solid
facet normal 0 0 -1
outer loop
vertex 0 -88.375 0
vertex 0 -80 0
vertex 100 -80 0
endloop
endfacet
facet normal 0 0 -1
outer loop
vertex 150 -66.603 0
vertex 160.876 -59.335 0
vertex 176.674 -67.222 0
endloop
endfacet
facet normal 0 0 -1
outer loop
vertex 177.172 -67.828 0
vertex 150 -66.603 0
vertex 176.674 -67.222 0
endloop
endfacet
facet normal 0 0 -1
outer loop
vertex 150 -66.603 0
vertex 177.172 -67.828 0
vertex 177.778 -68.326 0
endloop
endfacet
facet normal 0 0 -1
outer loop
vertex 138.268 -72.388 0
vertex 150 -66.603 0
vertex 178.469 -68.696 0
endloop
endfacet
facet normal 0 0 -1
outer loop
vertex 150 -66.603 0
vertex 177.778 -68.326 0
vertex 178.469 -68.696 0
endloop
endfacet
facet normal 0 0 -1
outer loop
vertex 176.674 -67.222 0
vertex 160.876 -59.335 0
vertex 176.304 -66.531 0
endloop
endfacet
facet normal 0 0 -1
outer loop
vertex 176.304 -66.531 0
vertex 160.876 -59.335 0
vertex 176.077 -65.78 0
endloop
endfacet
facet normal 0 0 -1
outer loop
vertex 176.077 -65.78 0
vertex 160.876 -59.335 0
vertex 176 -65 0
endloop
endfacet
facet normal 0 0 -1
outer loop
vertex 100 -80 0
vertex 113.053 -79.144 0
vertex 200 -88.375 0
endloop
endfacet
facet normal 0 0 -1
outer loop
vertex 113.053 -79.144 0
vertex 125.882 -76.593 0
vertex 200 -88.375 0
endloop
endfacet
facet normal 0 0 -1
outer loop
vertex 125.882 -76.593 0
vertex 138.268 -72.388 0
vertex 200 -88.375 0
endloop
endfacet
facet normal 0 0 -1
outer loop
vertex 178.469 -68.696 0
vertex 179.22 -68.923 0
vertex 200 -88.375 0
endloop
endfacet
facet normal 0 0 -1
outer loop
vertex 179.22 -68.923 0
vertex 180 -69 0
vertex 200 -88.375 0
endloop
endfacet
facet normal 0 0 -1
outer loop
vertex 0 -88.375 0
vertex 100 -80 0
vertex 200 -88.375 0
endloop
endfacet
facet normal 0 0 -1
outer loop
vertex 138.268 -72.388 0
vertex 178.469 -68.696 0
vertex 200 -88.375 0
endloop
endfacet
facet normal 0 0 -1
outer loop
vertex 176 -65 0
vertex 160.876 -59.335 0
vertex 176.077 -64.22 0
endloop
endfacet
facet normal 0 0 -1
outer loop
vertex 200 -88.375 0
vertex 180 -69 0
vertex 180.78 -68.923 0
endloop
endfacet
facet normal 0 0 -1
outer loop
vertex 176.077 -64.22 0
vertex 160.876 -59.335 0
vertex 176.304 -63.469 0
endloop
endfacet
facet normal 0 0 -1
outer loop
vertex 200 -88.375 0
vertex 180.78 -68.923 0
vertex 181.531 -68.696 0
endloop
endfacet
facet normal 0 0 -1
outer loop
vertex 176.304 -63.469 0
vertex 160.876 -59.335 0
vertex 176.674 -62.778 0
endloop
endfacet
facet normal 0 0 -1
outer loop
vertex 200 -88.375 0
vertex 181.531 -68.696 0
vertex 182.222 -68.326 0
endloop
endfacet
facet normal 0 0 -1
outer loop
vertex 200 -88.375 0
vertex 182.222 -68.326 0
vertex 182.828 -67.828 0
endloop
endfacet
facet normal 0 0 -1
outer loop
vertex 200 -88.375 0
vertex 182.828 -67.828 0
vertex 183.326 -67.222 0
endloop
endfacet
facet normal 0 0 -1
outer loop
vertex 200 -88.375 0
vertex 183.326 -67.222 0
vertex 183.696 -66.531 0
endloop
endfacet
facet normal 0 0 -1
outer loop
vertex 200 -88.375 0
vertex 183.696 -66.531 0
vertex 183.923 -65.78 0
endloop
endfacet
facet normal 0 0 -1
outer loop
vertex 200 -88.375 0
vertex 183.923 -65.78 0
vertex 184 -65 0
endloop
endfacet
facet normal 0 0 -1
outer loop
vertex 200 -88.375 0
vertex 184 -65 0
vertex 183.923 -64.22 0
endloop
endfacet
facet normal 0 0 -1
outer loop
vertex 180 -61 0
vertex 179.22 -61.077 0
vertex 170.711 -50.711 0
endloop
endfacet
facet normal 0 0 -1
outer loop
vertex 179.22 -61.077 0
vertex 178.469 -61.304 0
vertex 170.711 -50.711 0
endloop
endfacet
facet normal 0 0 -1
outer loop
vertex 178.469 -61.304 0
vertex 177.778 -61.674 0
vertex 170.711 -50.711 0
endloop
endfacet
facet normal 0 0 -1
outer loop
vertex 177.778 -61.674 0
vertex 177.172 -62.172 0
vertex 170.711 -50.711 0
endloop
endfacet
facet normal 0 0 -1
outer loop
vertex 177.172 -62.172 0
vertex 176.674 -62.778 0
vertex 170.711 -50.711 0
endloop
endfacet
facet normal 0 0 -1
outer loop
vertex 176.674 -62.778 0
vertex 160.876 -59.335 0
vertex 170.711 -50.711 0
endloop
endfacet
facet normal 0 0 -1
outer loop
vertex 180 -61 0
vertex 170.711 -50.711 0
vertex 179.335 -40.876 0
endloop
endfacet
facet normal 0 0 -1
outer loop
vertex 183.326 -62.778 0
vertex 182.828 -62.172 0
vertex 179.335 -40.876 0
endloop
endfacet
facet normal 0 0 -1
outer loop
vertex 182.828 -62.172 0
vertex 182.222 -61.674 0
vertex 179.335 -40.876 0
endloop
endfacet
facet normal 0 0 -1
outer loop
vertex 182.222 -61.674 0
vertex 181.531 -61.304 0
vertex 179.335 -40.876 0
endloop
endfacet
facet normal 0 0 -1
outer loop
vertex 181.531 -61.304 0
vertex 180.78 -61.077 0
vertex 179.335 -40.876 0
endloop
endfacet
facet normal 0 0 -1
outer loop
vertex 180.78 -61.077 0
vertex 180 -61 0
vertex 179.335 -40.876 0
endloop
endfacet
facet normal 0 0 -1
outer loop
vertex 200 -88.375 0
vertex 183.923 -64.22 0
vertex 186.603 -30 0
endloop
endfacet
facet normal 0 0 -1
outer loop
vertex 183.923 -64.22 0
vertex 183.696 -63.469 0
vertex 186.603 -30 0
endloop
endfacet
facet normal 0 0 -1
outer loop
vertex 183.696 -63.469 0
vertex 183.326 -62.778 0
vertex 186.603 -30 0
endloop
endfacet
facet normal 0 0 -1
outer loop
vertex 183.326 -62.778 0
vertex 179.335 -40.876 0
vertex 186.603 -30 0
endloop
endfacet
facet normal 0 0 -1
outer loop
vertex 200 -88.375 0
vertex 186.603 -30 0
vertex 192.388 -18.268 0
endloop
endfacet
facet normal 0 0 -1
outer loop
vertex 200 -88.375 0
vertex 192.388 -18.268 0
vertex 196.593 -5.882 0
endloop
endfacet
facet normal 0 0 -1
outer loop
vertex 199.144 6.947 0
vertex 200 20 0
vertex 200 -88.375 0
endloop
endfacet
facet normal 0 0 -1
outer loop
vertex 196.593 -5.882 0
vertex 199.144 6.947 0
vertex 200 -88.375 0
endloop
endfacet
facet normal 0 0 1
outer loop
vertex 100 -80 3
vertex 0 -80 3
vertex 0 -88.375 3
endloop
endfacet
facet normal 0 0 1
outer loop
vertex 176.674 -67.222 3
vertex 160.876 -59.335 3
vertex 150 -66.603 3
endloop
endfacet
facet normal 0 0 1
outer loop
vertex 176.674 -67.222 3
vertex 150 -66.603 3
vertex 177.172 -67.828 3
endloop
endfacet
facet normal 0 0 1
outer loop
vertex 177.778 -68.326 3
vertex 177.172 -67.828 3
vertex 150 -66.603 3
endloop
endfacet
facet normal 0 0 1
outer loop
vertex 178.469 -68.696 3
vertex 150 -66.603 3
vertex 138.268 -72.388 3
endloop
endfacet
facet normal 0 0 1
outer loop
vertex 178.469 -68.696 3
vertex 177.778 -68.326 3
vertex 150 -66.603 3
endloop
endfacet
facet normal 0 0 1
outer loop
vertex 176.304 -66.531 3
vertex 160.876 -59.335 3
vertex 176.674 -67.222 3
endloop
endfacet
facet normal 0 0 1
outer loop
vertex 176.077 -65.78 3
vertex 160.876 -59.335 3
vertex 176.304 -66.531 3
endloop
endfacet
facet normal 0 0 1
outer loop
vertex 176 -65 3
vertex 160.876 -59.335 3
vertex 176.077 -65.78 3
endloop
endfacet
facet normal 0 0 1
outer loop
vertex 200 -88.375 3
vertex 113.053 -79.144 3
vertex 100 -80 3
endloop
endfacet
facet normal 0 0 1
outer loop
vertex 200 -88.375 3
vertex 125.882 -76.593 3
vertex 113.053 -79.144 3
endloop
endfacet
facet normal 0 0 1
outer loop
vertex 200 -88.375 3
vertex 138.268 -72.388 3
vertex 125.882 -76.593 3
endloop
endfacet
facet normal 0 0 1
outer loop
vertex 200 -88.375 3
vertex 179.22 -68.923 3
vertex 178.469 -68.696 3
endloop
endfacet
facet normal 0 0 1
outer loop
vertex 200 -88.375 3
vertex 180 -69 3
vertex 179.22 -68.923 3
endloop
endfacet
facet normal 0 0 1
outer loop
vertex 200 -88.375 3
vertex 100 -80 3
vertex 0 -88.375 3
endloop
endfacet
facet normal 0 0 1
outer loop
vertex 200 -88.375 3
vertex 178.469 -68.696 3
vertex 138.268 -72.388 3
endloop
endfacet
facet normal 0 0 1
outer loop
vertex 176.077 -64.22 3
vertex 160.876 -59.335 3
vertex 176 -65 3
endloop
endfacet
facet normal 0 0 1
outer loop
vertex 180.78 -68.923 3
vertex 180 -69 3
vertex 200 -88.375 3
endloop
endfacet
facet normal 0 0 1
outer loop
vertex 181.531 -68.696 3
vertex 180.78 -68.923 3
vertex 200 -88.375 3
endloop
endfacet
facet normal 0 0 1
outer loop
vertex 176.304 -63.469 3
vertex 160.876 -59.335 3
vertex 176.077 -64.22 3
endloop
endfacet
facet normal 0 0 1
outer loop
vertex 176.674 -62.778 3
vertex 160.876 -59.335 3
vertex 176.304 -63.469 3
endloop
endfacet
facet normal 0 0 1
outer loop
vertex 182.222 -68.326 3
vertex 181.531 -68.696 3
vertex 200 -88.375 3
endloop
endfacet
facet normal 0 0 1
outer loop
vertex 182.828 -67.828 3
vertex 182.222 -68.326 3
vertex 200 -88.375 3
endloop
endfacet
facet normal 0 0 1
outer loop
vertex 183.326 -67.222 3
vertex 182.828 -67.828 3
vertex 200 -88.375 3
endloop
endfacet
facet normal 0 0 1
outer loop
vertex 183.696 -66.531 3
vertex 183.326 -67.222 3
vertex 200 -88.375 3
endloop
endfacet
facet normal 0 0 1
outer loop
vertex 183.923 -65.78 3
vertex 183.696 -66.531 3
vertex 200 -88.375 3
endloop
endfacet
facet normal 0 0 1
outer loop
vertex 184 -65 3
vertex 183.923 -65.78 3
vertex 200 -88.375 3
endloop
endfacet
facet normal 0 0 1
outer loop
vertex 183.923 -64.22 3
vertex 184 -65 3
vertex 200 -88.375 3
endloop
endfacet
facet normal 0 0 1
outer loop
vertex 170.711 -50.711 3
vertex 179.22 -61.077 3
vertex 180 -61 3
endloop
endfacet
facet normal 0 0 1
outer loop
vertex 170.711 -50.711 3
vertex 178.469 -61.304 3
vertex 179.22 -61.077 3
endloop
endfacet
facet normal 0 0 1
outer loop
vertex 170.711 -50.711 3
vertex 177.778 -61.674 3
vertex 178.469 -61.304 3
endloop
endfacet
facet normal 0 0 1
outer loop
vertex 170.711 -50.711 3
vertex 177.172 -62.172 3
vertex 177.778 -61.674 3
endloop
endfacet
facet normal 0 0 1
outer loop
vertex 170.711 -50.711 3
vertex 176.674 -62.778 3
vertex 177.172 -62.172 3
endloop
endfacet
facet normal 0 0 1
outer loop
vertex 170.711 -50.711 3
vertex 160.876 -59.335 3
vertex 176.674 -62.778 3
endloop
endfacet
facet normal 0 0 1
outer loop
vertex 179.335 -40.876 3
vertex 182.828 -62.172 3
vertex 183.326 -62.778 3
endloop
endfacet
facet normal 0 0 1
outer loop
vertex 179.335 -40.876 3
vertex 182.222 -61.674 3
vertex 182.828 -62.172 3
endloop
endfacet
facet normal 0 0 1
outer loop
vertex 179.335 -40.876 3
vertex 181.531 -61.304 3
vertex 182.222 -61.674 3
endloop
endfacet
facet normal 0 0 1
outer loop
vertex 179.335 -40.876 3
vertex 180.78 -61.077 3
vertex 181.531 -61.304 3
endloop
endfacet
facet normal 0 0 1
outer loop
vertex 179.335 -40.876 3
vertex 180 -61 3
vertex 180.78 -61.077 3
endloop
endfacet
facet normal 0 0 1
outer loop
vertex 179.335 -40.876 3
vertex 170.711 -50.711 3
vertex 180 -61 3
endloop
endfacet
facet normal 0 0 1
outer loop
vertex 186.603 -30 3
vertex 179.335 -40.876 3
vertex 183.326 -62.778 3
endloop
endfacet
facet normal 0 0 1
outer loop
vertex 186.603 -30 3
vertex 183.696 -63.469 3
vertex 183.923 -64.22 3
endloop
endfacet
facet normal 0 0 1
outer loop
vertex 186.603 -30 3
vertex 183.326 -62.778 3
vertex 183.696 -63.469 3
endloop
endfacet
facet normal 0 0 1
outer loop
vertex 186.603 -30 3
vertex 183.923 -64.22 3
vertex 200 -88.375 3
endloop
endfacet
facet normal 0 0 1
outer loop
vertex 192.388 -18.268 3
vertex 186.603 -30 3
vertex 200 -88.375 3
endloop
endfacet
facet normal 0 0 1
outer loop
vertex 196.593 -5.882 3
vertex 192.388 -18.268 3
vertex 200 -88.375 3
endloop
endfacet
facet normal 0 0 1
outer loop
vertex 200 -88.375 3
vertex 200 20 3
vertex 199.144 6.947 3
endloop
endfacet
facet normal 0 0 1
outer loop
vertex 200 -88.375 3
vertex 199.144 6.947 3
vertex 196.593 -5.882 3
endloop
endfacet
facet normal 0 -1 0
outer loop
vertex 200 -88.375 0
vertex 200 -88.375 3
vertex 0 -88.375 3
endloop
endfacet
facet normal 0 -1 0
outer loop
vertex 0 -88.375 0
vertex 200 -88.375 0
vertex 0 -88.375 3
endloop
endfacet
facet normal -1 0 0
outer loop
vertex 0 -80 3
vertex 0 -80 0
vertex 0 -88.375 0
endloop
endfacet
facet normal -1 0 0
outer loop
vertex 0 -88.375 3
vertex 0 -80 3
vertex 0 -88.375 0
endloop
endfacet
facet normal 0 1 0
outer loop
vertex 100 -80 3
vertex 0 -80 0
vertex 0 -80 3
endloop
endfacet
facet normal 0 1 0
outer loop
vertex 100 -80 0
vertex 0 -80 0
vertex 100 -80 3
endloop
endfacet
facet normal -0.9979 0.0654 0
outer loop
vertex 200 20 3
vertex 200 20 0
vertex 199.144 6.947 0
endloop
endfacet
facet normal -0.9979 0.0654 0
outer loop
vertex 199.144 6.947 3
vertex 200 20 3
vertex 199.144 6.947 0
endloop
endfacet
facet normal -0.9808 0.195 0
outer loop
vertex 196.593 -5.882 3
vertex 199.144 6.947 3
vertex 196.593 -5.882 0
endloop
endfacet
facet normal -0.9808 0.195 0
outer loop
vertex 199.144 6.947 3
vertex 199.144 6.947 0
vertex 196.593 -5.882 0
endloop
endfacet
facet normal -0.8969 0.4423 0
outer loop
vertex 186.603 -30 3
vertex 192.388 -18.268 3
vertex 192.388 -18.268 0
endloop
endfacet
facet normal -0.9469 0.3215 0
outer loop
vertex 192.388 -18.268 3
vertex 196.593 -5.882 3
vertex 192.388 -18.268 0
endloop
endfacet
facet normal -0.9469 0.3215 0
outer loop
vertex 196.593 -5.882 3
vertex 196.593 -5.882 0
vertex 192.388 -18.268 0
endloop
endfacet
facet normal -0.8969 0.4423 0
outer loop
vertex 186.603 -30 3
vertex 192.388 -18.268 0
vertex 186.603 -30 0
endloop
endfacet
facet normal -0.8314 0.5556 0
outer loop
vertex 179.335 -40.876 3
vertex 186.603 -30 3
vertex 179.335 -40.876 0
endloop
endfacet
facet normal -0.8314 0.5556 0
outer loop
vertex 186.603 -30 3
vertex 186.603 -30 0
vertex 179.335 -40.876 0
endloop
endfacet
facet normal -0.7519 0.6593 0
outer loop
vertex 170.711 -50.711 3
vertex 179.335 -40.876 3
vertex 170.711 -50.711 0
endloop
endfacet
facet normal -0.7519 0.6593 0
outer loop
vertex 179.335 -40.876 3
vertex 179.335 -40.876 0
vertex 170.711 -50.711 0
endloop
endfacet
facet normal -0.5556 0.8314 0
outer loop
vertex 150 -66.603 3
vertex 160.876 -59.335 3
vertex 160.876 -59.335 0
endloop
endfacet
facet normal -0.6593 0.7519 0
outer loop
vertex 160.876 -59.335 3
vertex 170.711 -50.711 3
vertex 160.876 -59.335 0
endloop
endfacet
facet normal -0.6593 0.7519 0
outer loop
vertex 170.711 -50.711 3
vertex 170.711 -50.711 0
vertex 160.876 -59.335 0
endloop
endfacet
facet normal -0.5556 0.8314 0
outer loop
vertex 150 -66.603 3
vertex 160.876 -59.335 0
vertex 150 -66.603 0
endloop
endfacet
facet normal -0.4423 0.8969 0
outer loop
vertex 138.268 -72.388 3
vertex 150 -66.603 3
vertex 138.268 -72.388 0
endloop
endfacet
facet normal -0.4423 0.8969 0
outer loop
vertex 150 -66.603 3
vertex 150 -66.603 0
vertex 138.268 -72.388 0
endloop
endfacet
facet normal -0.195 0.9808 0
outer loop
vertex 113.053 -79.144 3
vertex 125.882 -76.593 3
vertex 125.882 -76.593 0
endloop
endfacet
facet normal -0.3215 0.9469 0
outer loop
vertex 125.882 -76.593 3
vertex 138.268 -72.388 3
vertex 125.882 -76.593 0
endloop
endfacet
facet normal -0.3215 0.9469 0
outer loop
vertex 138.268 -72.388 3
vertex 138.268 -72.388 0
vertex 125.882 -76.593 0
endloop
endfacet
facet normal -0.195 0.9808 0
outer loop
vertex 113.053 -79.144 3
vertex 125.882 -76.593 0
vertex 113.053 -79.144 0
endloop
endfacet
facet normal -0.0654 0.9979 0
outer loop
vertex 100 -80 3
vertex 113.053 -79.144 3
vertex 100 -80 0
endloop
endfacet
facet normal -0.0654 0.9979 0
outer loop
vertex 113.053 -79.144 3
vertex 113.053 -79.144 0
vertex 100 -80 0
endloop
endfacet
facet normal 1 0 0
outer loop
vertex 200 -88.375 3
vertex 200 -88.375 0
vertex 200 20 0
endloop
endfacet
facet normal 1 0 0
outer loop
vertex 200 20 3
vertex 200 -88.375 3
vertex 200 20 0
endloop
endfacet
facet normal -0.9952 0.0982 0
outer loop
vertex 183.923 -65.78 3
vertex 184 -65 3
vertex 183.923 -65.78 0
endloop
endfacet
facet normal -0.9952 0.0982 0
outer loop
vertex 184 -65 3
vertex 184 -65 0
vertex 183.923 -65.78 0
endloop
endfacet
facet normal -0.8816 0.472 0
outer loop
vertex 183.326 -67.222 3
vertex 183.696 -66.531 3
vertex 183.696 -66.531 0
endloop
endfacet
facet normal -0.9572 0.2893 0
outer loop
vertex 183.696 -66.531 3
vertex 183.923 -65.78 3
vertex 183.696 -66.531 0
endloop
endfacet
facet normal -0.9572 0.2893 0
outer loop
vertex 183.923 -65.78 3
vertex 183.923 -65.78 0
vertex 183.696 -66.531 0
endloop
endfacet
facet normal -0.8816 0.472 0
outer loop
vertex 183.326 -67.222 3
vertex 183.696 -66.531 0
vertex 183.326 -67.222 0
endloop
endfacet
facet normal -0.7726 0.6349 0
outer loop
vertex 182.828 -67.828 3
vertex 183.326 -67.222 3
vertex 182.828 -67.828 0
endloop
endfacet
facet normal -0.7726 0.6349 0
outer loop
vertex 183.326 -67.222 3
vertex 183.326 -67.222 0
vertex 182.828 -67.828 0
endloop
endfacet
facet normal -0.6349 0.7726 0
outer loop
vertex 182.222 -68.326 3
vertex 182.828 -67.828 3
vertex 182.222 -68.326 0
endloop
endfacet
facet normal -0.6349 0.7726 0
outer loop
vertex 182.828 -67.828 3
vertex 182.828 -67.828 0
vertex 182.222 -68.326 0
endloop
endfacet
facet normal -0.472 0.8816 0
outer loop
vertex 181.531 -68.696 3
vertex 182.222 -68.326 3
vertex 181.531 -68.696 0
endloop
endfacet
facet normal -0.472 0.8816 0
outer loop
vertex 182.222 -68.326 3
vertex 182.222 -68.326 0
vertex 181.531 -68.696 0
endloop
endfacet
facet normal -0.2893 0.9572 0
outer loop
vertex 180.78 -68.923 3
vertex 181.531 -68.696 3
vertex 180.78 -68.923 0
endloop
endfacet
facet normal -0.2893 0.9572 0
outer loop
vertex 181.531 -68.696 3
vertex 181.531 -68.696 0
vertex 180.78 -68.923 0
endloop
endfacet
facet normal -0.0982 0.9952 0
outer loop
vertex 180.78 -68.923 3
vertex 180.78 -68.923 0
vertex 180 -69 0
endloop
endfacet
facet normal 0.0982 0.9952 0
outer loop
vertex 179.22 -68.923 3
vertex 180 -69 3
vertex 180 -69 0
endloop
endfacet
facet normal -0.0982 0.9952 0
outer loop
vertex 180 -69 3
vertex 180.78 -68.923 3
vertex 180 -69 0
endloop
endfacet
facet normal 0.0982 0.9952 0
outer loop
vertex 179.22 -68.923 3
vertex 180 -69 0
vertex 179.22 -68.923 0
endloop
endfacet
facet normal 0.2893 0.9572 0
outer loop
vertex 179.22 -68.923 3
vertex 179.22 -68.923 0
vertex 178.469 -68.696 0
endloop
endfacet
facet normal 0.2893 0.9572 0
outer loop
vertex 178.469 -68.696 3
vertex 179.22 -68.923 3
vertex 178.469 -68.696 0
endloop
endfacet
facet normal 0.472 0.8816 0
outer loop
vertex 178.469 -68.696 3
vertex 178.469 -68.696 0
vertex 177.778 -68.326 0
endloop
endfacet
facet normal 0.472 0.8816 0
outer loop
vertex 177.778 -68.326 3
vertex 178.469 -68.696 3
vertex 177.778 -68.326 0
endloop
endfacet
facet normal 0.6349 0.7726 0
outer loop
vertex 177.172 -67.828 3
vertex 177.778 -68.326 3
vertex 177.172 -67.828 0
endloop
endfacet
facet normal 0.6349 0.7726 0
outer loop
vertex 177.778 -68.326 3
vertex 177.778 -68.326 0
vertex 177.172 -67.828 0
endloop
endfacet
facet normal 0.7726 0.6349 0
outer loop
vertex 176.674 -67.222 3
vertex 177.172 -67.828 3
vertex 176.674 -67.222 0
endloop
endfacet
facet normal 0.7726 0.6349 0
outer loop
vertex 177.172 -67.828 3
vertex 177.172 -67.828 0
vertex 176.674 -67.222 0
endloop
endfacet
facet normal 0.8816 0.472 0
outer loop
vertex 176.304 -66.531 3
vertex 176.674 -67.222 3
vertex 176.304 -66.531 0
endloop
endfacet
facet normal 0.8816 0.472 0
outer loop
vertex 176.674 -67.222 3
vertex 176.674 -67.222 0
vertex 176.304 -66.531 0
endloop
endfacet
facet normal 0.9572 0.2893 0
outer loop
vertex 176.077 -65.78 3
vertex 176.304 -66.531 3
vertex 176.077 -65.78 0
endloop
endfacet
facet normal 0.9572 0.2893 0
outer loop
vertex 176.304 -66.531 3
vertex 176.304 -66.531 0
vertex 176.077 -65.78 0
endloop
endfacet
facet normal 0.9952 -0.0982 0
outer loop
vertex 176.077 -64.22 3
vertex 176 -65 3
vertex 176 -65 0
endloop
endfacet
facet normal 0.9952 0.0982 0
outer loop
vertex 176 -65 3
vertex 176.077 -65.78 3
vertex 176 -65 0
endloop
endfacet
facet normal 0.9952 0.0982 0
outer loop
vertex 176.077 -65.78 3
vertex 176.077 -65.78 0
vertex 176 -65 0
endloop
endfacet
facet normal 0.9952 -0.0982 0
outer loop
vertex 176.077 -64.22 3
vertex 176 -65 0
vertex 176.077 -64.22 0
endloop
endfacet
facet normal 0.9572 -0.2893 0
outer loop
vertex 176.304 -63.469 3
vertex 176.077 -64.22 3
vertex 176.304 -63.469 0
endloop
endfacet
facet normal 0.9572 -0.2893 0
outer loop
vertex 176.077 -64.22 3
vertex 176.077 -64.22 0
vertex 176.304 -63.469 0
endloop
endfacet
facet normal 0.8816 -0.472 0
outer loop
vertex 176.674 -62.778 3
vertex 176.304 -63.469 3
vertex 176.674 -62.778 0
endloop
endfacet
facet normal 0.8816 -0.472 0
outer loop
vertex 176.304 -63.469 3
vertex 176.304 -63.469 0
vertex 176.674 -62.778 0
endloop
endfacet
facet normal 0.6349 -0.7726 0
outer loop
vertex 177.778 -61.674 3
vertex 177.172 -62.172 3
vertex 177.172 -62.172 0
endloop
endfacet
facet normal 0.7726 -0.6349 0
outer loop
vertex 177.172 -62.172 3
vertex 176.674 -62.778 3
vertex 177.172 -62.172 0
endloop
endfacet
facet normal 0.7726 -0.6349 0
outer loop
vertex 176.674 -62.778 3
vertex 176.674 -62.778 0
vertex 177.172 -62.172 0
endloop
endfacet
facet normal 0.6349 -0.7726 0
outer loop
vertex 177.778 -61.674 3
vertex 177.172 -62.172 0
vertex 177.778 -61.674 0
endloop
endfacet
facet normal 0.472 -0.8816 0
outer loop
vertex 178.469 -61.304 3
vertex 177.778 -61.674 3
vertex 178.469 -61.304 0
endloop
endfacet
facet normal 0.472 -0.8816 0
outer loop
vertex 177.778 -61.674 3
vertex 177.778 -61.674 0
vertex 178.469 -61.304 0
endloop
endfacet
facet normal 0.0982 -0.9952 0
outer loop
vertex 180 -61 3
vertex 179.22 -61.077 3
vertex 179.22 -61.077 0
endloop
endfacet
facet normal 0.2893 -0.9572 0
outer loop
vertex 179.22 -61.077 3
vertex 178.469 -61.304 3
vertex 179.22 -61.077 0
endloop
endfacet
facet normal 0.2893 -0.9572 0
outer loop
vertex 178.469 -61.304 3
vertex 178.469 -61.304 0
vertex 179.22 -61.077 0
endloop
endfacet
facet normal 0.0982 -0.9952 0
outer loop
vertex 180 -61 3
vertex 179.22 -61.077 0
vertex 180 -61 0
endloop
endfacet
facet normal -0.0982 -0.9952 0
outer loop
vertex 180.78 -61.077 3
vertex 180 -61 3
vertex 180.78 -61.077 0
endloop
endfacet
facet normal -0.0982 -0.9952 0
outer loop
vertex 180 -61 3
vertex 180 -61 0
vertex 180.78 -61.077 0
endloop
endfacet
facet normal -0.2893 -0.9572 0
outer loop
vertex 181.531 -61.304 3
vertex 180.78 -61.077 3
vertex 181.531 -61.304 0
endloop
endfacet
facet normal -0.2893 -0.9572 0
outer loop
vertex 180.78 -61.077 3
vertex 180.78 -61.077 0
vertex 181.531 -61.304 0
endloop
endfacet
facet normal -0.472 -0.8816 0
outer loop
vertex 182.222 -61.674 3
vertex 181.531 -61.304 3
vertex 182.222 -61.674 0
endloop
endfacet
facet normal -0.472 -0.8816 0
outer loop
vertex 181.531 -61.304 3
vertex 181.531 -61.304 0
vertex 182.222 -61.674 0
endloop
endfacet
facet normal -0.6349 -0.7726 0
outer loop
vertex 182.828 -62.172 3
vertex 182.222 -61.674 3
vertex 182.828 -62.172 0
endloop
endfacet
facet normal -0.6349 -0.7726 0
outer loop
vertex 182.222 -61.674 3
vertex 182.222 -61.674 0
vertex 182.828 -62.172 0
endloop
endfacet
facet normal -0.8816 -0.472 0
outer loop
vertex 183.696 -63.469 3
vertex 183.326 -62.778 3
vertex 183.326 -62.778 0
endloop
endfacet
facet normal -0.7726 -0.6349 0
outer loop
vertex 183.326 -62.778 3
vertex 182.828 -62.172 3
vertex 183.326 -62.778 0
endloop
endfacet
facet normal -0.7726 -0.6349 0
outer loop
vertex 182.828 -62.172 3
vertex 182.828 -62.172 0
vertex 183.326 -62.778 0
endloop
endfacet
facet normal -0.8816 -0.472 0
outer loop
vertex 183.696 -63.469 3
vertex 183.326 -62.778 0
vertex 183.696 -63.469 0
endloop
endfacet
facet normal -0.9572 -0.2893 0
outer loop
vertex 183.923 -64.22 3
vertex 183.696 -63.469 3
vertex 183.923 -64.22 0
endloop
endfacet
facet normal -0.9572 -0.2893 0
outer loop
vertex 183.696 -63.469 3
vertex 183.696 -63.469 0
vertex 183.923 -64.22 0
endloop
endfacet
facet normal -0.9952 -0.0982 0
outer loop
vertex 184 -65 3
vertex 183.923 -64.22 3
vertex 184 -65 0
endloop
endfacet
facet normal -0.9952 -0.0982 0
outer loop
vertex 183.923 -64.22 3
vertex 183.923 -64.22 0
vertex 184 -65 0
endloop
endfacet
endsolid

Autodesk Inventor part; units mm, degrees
ref_plane "YZ Plane" through (0, 0, 0) normal (1, 0, 0) x (0, 1, 0)
ref_plane "XZ Plane" through (0, 0, 0) normal (0, 1, 0) x (-1, 0, 0)
ref_plane "XY Plane" through (0, 0, 0) normal (0, 0, 1) x (1, 0, 0)
sketch "草圖1" plane through (0, 0, 0) normal (0, 0, 1) x (1, 0, 0)
  line L0 (0, -80) -> (100, -80)
  arc A0 (100, -80) -> (200, 20) centre (100, 20) ccw
  line L1 (200, 20) -> (200, 40)
  line L2 (200, 40) -> (100, 40)
  line L3 (100, 40) -> (100, -80)
  line L4 (100, -80) -> (200, -80)
  line L5 (200, -80) -> (200, 40)
  line L6 (215, -80) -> (200, -80)
  circle A1 centre (180, -65) radius 4
  line L7 (200, -80) -> (0, -80)
  line L8 (0, -80) -> (0, -88.525)
  line L9 (0, -88.525) -> (200, -88.525)
  line L10 (200, -88.525) -> (200, -80)
  point P0 (200, 20)
  dimension "d5" = 8
  dimension "d6" = 8.525
  dimension "d12" = 15
  dimension "d13" = 20
extrude "擠出1" add sketch "草圖1" along normal blind 3 contours L0 L4 L10 L9 L8 | A0 L5 L4
sketch "草圖3" plane through (0, 0, 3) normal (0, 0, 1) x (1, 0, 0)
  line L0 (200, -88.525) -> (200, 20) projected
  line L1 (0, -88.525) -> (200, -88.525) projected
  line L2 (0, -88.525) -> (200, -88.525)
  line L3 (200, -88.525) -> (200, -88.375)
  line L4 (200, -88.375) -> (0, -88.375)
  line L5 (0, -88.375) -> (0, -88.525)
  point P0 (0, 0)
  dimension "d11" = 0.15
extrude "擠出2" cut sketch "草圖3" against normal up to surface (3 mm away)
